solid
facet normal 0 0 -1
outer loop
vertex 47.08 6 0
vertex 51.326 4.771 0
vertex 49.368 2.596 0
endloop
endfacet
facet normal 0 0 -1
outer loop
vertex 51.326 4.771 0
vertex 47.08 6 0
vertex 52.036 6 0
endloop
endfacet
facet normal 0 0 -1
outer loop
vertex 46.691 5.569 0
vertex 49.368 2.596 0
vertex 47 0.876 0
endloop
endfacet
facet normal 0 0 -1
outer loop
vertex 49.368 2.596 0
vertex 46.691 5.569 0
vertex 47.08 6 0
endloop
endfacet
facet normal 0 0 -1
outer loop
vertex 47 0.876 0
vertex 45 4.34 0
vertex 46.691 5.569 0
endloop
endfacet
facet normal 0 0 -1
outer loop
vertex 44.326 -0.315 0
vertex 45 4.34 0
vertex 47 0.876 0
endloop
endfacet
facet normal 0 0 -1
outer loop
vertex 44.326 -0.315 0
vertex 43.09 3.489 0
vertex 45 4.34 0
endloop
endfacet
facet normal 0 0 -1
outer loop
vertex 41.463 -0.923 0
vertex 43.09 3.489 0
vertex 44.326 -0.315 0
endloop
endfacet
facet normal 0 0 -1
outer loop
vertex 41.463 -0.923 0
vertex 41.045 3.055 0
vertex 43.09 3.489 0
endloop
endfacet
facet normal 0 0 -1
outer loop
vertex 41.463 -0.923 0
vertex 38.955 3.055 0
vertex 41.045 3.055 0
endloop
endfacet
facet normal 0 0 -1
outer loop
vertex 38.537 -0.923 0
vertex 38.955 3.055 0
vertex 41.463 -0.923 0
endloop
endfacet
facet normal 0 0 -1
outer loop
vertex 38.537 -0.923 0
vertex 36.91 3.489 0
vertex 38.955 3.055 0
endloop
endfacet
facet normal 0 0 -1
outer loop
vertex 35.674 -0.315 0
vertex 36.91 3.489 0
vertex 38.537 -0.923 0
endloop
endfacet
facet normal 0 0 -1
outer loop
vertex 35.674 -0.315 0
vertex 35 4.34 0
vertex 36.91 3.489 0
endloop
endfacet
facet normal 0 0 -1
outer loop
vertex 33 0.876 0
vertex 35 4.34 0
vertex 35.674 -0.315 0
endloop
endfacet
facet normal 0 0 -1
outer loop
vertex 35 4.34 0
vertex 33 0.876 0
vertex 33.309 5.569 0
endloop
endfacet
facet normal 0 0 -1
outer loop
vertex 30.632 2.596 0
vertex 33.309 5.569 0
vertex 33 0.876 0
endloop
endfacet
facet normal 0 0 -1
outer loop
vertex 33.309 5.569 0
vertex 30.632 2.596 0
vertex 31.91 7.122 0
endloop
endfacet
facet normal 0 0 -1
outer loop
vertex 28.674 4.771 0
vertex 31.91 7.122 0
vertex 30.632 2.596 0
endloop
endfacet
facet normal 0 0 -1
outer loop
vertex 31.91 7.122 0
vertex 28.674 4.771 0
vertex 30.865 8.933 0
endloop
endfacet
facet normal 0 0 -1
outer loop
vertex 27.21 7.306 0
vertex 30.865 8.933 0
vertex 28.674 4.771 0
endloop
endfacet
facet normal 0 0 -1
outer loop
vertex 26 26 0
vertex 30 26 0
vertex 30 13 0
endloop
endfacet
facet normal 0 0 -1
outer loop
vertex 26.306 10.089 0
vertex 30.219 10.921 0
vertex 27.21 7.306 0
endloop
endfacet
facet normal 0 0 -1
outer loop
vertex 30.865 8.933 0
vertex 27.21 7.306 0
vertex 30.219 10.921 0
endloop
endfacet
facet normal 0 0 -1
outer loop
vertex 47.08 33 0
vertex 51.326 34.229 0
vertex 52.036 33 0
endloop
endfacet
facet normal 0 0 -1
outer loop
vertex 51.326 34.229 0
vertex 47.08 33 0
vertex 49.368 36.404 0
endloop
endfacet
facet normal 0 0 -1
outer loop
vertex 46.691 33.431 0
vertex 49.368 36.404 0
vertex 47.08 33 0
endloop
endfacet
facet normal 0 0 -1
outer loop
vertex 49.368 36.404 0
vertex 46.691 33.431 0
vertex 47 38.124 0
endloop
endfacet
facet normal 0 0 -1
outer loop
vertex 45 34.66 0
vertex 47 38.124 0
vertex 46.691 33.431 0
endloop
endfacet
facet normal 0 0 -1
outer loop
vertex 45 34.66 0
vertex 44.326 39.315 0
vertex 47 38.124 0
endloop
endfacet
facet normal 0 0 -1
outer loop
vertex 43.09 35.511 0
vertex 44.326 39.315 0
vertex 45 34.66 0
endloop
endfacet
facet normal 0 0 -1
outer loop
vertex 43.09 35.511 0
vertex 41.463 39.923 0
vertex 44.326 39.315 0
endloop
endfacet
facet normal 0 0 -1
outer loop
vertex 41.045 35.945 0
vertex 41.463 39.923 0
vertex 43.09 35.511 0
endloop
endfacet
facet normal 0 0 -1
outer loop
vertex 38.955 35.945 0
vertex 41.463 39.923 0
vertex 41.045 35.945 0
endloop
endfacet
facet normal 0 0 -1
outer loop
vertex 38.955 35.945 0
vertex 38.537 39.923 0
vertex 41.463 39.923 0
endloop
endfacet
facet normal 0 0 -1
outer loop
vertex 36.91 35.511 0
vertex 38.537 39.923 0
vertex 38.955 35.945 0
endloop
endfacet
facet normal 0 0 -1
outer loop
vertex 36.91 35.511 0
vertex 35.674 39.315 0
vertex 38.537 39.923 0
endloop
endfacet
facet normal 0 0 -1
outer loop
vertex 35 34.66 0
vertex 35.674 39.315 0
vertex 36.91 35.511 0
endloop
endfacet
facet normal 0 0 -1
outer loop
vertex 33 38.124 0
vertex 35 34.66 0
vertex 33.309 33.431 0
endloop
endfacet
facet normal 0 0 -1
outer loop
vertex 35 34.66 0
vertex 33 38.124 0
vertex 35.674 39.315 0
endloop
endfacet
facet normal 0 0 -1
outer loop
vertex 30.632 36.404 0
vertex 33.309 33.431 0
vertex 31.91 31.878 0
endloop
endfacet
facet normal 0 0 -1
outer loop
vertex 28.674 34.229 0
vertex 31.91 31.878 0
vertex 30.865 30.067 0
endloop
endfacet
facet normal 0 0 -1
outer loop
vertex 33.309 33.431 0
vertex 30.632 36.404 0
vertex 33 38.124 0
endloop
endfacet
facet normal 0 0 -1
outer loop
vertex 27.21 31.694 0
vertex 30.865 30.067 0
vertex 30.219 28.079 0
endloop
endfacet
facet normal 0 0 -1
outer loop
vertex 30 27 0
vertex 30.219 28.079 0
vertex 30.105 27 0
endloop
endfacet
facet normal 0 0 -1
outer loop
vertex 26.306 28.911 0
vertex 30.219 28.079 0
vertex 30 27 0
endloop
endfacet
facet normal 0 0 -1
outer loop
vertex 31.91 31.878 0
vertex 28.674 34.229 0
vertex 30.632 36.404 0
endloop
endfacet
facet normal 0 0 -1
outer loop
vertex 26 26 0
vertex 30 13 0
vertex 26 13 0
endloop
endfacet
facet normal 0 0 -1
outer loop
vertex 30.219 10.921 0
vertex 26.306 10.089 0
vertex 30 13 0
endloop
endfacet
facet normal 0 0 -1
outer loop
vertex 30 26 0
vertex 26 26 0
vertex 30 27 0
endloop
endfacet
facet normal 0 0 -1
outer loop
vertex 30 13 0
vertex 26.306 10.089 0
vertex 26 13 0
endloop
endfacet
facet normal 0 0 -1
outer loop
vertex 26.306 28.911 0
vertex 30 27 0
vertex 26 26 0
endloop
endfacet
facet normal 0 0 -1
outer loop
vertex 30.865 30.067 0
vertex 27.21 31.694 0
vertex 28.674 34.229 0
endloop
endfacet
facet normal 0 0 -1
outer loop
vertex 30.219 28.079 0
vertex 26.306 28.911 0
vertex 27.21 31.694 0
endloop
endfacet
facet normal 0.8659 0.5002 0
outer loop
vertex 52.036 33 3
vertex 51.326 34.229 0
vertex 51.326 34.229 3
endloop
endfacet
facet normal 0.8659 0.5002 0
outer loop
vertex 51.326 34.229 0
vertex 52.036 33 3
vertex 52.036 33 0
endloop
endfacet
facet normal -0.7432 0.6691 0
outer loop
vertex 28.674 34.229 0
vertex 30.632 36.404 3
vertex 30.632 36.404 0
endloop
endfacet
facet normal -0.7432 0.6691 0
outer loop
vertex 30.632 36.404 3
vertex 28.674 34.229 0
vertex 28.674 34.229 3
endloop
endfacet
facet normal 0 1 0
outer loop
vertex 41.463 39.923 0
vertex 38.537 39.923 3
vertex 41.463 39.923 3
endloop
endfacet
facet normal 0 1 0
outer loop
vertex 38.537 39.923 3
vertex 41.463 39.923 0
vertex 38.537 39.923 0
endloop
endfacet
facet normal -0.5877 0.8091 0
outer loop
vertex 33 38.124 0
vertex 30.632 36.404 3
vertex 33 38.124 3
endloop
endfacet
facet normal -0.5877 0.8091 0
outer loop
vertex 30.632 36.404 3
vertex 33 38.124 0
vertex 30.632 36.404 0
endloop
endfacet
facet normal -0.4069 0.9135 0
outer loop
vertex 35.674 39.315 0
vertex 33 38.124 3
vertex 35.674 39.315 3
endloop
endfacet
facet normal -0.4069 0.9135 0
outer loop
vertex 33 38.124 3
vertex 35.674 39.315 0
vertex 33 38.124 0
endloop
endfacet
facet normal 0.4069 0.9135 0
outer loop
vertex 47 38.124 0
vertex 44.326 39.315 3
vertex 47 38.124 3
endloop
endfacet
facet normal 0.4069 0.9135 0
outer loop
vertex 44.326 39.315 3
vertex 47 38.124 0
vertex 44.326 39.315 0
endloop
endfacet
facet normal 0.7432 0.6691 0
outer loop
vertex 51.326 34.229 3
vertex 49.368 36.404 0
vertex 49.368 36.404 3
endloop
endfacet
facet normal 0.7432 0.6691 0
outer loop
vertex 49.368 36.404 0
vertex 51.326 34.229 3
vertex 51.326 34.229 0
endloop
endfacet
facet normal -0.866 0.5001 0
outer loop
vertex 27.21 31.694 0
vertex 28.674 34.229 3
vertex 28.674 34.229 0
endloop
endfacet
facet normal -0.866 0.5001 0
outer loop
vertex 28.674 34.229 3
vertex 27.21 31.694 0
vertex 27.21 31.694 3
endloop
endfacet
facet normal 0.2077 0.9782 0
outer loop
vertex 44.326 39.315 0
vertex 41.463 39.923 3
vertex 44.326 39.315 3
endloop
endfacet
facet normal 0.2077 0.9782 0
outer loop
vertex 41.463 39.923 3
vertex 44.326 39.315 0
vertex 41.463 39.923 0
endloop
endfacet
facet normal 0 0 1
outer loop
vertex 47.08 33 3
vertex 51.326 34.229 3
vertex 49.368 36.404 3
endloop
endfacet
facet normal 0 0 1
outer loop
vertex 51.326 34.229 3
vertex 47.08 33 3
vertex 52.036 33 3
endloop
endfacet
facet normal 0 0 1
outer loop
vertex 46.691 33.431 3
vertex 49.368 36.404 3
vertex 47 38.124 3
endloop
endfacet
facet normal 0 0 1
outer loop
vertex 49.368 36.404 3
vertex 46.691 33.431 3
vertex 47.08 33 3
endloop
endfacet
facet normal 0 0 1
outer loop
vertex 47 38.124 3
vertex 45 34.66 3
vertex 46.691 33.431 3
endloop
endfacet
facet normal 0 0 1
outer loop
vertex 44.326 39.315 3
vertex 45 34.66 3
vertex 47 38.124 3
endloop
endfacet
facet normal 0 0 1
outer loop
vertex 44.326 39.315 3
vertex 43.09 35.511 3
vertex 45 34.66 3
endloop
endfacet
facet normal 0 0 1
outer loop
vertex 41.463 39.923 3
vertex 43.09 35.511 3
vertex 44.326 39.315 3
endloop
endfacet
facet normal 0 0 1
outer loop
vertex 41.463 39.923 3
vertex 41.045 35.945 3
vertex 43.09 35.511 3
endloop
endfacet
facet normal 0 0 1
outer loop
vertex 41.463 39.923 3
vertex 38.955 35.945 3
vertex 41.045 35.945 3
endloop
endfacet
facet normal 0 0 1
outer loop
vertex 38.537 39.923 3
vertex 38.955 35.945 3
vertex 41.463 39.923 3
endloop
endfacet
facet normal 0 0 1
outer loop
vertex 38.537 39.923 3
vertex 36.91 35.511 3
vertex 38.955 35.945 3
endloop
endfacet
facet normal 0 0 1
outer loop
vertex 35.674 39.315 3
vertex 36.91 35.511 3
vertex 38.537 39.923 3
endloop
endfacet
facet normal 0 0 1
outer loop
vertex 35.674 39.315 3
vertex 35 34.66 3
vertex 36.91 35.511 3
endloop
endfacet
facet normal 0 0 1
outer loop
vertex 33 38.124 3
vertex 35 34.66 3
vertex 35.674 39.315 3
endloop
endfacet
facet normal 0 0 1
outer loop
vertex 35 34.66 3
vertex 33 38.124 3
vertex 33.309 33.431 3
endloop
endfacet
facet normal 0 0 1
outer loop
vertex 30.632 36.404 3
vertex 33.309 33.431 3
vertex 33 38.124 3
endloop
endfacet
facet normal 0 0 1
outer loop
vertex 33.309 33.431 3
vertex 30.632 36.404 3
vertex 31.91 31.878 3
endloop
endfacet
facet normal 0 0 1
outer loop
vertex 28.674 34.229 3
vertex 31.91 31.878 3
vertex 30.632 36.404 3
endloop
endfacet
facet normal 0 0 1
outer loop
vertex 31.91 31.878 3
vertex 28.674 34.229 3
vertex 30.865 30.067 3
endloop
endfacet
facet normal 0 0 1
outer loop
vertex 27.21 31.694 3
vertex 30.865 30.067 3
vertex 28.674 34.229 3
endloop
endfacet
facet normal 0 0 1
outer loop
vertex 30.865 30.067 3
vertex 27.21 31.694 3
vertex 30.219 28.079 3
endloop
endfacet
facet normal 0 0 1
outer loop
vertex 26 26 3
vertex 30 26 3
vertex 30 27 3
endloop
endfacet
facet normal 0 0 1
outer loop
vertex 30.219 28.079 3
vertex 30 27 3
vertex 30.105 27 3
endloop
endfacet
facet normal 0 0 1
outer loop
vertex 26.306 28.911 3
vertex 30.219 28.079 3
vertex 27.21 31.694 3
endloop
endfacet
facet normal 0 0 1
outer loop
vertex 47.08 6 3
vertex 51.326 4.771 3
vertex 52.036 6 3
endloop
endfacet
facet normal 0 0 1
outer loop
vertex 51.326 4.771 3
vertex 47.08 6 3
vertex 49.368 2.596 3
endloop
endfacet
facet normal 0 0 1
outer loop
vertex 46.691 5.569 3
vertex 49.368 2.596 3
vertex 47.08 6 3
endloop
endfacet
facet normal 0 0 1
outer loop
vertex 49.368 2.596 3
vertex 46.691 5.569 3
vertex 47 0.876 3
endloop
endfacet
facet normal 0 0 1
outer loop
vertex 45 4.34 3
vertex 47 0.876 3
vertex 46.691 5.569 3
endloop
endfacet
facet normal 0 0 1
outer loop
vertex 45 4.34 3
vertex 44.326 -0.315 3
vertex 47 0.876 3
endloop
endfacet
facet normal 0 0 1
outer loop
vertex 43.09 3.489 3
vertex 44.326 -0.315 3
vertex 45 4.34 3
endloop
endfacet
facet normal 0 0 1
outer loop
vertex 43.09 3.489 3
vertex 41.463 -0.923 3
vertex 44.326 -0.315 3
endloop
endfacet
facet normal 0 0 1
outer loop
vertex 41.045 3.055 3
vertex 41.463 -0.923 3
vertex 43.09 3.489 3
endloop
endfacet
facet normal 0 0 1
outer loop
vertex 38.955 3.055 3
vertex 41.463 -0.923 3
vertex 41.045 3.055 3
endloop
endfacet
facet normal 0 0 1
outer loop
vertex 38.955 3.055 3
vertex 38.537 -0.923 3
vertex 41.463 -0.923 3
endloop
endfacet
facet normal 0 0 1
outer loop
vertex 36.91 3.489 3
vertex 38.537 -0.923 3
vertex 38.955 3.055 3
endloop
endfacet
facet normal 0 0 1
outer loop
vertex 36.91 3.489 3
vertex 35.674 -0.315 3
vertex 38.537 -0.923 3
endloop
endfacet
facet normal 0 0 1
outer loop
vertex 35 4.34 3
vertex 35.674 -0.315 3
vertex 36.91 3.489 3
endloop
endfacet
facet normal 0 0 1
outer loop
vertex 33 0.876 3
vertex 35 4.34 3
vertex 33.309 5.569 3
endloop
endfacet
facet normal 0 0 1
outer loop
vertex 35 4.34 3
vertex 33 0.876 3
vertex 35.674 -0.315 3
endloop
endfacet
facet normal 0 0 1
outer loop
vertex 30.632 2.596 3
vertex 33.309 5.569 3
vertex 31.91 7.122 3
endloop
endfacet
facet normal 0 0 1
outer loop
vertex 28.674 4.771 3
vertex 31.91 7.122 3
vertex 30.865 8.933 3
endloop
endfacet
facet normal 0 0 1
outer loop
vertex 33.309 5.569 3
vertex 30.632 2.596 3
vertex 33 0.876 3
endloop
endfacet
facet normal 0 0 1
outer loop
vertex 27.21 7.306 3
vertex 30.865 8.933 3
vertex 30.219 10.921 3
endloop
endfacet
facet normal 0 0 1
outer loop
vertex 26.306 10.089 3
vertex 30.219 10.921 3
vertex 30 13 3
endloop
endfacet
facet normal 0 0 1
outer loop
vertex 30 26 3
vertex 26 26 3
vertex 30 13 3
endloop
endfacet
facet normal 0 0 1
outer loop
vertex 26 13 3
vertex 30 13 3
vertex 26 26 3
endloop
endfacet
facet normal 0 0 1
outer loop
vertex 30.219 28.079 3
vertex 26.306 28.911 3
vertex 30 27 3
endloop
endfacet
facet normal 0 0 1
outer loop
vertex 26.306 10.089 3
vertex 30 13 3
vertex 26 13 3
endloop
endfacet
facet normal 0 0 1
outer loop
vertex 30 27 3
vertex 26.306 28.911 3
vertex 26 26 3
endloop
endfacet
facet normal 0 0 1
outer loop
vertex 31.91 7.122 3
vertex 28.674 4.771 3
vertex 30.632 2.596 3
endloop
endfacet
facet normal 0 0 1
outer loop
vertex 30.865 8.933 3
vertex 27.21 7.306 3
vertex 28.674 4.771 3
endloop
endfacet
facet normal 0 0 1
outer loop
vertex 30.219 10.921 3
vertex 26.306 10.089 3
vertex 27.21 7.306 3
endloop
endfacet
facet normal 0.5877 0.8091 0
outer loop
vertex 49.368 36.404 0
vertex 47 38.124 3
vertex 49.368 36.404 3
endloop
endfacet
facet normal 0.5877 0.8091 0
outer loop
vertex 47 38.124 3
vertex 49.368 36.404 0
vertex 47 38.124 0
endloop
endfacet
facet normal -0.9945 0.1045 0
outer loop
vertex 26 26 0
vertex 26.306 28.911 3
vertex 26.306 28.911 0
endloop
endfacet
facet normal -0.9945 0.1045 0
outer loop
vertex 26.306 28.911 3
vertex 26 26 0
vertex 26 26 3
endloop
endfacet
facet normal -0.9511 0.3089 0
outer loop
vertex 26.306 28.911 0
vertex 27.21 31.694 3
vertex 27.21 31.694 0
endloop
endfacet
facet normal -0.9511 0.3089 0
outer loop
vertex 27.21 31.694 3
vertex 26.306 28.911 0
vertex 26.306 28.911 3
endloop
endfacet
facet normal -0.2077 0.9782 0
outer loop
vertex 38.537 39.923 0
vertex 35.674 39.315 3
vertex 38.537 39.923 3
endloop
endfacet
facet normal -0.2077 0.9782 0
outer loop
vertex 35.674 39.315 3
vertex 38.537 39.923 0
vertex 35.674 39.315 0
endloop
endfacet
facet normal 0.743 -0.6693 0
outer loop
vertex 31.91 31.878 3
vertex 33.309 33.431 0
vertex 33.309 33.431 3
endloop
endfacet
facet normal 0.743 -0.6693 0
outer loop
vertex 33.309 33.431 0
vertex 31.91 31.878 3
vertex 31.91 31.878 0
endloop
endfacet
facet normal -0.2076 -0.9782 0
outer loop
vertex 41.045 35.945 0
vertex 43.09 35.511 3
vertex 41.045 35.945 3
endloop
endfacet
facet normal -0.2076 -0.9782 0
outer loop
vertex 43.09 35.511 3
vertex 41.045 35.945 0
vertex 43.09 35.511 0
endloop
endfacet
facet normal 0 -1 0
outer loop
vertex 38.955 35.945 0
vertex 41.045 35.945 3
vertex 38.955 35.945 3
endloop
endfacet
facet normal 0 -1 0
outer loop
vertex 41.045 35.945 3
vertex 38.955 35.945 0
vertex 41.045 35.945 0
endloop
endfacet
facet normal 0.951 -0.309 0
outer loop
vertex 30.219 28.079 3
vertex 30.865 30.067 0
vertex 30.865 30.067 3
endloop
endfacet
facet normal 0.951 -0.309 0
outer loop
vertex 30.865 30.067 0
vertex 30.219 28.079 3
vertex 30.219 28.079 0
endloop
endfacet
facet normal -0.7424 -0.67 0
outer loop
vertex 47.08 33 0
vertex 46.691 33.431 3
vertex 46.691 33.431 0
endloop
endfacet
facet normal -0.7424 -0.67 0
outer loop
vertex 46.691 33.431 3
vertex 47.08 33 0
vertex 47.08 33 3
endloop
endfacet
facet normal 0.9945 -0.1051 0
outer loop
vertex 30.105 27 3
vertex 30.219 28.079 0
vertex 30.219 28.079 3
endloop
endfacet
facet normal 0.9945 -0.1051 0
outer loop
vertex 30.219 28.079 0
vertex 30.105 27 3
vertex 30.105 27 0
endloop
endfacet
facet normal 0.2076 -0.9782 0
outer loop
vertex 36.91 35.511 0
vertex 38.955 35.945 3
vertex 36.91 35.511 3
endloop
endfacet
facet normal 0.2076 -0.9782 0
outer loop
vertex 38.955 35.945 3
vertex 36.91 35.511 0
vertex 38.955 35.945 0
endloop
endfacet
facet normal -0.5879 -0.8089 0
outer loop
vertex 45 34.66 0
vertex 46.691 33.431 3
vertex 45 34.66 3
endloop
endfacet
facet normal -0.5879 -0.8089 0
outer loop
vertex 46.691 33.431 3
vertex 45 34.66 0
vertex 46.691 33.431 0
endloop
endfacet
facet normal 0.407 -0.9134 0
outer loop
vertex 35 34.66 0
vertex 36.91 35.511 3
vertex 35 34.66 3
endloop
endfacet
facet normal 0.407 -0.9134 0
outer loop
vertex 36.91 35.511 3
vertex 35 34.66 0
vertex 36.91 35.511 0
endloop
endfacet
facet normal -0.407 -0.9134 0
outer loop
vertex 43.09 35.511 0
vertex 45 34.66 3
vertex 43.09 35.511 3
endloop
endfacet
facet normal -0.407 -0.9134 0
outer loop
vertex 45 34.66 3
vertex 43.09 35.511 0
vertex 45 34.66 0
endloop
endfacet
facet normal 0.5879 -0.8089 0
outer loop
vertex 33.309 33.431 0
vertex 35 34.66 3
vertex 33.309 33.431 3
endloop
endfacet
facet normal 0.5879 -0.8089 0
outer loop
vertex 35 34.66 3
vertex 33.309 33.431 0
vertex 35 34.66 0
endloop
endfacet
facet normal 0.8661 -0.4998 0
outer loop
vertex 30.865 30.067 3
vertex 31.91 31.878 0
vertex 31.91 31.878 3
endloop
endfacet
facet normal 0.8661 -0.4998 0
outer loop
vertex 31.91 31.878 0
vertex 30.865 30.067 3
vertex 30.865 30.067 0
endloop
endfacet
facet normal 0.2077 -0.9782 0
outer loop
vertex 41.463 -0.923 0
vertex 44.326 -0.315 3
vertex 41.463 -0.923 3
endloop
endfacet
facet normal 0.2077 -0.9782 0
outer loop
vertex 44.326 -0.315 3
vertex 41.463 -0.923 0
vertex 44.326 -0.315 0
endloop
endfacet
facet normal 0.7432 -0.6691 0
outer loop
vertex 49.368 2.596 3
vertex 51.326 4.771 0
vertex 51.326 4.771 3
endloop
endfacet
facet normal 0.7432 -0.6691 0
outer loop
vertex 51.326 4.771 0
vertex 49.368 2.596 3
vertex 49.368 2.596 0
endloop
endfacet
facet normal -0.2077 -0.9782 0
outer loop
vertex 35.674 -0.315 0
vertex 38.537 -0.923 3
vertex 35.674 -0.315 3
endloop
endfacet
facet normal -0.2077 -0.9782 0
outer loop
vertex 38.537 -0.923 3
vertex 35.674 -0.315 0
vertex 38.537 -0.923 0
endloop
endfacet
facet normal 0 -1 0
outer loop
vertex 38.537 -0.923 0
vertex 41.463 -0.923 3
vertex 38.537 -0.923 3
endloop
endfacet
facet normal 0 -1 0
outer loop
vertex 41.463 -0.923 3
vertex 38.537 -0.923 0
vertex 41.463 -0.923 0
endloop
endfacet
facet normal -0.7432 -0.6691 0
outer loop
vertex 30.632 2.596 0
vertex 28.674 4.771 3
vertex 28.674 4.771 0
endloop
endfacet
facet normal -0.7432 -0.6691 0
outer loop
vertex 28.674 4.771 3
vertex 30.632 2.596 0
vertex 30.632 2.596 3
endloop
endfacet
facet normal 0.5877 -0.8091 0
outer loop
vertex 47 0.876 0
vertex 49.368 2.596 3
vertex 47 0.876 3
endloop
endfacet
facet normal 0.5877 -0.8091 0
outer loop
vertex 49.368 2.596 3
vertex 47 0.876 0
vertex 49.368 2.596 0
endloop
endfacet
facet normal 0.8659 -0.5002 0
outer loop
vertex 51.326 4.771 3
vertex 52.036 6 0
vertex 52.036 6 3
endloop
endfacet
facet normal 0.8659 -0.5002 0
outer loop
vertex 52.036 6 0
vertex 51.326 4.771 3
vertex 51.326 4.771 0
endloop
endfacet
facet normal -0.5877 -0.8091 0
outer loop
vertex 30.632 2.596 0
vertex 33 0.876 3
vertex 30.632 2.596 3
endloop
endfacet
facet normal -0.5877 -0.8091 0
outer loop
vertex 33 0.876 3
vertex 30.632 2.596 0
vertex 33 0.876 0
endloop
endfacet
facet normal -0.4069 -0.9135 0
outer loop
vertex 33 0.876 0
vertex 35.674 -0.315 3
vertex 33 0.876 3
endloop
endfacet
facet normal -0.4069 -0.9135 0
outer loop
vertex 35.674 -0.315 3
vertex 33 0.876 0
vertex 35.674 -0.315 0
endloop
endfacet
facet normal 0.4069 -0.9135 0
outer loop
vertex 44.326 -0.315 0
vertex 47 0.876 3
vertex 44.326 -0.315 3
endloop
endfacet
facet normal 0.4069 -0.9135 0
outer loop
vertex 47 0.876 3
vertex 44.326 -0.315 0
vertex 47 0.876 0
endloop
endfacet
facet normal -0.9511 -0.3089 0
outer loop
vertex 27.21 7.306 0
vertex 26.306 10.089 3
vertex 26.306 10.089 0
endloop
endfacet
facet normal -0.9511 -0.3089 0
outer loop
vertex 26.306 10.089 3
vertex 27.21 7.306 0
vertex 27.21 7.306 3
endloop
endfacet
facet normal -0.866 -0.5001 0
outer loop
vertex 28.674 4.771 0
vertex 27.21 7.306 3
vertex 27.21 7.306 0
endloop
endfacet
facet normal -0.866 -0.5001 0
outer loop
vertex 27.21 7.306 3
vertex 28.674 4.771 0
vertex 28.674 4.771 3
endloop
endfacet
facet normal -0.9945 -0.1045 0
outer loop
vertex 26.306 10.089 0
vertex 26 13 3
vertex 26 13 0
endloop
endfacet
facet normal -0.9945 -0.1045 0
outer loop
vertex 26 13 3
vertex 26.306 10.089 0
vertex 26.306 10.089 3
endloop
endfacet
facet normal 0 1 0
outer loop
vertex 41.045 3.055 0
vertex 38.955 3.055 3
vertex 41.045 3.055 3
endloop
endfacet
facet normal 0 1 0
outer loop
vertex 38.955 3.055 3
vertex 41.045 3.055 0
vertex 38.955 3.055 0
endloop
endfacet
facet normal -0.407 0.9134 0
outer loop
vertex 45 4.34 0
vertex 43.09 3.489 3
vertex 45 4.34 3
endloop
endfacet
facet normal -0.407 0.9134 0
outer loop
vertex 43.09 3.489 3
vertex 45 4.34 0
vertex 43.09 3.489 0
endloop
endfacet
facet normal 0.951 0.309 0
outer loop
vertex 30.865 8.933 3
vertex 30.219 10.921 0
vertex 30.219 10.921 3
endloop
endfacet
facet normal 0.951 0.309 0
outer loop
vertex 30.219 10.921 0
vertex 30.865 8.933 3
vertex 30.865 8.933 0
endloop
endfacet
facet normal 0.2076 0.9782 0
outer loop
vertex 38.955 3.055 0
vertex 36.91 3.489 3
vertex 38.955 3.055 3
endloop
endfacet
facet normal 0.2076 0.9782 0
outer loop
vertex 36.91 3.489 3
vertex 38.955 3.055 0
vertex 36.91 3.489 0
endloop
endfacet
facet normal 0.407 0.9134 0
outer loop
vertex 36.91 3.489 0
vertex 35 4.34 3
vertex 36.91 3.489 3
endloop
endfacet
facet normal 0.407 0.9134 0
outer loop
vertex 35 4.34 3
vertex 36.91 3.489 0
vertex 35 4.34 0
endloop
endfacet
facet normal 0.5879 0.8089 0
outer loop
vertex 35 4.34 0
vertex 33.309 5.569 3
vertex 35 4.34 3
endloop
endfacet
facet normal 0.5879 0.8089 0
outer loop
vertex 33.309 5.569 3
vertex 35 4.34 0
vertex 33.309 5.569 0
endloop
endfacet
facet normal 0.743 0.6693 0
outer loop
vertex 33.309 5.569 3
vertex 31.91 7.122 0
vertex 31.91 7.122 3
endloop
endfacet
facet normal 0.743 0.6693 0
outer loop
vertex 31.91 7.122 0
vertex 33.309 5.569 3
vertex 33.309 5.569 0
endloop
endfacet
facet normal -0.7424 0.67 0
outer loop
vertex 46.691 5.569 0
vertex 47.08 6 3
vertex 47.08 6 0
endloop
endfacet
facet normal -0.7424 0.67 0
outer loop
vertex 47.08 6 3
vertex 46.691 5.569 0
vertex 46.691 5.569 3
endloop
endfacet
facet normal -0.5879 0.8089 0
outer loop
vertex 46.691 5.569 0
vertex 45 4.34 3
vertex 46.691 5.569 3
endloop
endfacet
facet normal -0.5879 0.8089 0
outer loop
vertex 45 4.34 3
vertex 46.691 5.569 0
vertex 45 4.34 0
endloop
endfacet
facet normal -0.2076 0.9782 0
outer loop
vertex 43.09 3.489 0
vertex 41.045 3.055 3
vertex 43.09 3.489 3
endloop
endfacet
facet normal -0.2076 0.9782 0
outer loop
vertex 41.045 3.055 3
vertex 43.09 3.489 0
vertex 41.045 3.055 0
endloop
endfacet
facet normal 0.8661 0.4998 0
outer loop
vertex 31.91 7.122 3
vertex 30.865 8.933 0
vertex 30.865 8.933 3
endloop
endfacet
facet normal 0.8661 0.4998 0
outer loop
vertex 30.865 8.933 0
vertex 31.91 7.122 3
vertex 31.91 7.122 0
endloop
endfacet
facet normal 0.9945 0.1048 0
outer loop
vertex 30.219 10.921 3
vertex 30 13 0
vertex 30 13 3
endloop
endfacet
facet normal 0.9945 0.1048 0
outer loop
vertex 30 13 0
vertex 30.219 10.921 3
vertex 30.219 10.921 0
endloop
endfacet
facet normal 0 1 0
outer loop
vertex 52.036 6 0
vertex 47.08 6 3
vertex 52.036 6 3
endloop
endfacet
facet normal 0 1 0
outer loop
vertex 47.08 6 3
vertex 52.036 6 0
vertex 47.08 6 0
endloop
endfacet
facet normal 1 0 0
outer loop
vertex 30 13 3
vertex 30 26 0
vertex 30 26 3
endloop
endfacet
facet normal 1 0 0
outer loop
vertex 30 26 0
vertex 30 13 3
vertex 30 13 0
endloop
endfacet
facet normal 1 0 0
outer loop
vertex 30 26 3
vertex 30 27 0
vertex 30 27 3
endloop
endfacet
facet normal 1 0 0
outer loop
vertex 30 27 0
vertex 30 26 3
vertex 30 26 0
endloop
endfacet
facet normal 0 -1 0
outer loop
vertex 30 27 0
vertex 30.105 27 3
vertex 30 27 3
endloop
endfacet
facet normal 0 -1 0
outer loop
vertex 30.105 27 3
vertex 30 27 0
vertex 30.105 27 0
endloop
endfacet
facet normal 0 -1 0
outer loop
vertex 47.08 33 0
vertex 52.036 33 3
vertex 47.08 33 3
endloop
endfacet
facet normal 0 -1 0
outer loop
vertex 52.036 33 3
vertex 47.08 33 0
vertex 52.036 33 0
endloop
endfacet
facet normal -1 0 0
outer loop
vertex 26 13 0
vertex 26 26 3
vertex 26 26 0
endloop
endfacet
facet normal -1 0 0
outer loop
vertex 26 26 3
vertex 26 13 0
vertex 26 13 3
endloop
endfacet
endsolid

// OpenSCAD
//Парметры в разработке
z=3;
x=10;
union(){

translate([26,13,0]) cube([4,13,z]);
difference(){
union(){
	
  difference(){
  translate([40,26,0]) cylinder(z,x+4,x+4);
  translate([40,26,-1]) cylinder(z+2,x,x);
  translate([33,12,-1]) cube([20,20,z+2]);

}

difference(){
  translate([40,13,0]) cylinder(z,x+4,x+4);
  translate([40,13,-1]) cylinder(z+2,x,x);
  translate([32,15,-1]) cube([19,13,z+2]);
  translate([40,6,-1]) cube(20);
}
}
  translate([30,13,-1]) cube([z+2,x+4,z+2]);
  translate([42,13,-1]) cube(20);
}
}
